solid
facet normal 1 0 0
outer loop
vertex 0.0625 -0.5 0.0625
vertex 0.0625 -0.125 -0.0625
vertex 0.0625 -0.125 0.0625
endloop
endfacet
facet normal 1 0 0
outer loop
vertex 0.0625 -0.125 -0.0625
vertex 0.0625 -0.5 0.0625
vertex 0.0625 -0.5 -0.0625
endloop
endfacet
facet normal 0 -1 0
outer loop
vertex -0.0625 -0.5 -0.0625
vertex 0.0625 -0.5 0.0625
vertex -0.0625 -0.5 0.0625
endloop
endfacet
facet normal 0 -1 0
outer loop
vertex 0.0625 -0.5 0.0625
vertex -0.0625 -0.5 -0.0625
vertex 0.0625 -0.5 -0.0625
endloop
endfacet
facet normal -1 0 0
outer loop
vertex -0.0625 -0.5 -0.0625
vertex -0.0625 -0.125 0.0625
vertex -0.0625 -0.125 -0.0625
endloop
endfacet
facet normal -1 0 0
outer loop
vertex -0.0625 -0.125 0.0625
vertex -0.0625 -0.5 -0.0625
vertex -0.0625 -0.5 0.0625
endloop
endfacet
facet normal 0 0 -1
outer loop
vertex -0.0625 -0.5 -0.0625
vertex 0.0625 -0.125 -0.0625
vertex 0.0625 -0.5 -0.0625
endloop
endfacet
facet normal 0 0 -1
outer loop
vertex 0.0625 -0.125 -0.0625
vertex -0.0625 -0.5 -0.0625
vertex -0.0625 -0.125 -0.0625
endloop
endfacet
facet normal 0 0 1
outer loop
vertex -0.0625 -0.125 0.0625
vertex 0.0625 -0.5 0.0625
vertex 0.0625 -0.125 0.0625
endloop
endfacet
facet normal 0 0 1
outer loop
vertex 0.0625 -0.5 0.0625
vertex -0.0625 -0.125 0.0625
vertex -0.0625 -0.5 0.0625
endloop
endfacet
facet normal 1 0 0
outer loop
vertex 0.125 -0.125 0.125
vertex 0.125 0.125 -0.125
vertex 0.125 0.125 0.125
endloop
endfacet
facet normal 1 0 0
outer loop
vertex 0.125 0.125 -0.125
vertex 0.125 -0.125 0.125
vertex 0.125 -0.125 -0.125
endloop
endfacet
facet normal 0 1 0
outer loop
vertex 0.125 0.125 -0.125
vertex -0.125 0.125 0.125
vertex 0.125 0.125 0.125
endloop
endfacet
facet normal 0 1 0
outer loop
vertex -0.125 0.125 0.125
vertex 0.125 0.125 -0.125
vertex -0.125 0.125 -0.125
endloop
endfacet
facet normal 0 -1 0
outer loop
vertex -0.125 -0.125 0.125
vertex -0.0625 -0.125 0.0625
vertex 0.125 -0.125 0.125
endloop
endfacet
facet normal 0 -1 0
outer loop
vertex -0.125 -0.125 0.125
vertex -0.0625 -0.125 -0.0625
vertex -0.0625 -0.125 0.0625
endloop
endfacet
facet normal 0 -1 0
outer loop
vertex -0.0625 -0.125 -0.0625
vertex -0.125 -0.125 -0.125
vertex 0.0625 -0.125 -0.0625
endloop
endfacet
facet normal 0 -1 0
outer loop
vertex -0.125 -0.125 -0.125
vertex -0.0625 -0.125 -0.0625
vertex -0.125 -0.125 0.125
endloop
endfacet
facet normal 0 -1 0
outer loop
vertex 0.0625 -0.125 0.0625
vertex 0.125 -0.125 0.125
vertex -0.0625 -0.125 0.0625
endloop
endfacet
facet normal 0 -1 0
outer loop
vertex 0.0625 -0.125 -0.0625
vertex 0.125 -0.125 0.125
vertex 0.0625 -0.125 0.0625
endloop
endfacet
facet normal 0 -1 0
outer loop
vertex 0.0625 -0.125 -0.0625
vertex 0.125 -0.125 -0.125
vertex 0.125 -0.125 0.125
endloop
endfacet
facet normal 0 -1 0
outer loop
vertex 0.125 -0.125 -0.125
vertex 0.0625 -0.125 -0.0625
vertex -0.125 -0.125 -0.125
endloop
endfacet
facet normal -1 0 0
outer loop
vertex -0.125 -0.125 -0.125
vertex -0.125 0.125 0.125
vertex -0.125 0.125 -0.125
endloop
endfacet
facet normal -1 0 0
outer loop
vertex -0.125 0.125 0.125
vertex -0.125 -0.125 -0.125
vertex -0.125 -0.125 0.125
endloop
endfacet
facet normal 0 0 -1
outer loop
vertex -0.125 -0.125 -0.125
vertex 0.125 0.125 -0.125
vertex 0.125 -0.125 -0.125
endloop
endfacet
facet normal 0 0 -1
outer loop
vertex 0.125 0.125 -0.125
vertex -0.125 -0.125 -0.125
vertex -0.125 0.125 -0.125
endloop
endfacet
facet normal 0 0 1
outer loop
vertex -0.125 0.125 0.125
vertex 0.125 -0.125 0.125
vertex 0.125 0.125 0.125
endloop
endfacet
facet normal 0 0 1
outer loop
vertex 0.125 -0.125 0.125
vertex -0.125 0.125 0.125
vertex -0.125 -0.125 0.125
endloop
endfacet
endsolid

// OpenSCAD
rotate(-90, [1, 0, 0]) {
    translate([0, 0, -4/16])
    cube([2/16, 2/16, 8/16], center = true);
    cube([4/16, 4/16, 4/16], center = true);
}
